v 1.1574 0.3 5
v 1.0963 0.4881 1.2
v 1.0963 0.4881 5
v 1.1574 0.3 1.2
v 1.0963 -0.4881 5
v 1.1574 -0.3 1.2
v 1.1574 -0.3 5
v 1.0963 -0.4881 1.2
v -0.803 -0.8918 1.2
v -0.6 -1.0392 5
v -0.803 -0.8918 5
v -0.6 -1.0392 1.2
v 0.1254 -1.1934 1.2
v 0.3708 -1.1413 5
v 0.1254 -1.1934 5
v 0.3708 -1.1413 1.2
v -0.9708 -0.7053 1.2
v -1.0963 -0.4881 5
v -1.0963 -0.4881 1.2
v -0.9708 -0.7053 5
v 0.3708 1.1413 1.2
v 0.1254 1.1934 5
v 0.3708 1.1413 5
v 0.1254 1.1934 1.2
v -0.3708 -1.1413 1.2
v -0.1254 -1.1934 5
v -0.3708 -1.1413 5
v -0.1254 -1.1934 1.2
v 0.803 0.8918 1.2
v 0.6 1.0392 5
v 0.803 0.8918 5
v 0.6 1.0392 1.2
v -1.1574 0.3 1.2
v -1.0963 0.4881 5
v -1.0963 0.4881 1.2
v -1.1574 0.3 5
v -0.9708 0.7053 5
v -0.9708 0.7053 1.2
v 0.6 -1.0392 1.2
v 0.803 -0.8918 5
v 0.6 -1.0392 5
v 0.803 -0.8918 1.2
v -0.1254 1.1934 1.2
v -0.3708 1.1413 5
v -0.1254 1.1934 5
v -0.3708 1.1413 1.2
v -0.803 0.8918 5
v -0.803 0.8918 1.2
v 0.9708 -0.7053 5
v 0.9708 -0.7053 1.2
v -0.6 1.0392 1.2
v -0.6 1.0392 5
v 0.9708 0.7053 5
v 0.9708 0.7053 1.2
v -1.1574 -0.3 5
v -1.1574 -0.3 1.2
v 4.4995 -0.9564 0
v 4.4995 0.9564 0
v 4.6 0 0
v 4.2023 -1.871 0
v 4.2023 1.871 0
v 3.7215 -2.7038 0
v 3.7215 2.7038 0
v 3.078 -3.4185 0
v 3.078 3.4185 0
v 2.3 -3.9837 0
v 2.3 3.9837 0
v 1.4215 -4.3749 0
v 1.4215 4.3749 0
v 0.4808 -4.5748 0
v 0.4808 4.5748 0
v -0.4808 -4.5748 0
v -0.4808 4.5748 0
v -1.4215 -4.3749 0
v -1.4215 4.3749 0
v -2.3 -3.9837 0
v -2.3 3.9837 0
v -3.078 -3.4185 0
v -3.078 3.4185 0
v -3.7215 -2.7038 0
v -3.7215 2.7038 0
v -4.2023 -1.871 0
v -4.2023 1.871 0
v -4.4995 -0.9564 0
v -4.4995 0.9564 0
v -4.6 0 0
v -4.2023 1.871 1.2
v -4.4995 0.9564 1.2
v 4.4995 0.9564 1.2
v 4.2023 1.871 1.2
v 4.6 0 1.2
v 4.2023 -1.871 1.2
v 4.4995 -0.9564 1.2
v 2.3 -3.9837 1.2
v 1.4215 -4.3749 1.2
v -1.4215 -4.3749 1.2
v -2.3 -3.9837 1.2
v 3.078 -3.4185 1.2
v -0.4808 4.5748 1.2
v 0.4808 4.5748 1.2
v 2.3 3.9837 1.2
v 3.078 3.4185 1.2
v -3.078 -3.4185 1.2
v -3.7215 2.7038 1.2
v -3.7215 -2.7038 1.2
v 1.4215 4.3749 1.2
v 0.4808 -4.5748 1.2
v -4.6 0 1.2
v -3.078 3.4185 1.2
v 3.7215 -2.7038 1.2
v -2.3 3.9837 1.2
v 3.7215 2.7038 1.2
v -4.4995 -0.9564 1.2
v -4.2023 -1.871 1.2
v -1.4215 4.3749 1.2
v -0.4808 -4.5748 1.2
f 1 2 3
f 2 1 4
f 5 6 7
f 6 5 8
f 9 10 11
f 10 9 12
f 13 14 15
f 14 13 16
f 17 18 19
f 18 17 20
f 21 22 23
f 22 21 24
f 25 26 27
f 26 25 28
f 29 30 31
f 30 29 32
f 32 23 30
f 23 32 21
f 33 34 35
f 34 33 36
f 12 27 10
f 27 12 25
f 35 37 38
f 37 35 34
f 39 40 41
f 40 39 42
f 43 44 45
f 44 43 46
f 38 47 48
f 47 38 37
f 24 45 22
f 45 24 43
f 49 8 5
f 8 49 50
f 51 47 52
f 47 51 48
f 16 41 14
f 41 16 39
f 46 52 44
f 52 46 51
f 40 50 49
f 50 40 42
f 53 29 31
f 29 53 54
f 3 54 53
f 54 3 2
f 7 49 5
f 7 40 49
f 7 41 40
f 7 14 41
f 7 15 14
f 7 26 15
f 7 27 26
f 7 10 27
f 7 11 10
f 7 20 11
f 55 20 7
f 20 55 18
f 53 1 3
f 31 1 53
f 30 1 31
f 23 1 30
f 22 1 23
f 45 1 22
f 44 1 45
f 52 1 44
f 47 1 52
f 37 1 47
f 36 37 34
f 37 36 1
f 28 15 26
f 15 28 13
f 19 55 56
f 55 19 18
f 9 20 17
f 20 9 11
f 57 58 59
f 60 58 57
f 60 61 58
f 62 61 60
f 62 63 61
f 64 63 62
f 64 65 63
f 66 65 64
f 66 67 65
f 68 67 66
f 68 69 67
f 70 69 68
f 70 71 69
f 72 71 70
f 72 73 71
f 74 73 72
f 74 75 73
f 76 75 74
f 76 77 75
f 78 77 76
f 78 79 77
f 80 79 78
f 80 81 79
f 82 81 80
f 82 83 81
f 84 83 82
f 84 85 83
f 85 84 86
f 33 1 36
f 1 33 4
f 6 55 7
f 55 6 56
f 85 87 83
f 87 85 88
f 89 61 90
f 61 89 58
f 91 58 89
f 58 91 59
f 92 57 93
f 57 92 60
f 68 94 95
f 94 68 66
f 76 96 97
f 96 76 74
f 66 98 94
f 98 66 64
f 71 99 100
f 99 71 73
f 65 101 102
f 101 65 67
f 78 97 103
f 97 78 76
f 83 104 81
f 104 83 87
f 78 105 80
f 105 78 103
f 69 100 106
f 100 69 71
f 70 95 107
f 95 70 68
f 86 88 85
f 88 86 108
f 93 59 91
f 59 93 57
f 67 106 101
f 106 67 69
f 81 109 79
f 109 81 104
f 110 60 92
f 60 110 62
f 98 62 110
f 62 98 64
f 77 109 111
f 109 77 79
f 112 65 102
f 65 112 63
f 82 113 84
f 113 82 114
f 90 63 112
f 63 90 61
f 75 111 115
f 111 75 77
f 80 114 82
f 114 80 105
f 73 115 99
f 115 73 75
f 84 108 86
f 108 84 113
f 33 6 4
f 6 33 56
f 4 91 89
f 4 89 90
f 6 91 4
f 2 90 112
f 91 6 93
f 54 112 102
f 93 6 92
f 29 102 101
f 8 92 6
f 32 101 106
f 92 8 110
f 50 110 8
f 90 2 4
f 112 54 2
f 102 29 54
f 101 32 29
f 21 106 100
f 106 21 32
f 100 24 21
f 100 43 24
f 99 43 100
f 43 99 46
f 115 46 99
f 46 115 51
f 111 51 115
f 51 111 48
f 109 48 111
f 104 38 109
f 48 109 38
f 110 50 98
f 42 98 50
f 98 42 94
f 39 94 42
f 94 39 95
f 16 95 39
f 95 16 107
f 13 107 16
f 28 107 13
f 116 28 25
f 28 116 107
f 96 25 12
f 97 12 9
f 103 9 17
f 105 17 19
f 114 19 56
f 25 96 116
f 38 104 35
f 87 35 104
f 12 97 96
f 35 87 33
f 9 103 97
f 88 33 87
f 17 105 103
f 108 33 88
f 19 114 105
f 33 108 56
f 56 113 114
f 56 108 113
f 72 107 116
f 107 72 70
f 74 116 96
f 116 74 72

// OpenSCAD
//////////////////////////////////////////////////////////////////////////////////////////////
module pin (
)
{
    
gear = 1;
    collaHeightOffset = 0;
    collaDiamater = 10;
    gearHeight = 3;
    keyWidth = 2;
    keyHeight = 2;
    collaWidth = 1.4;
    gearDiamater = 35;

    collaSpacing = 2.0;
    
    collaHeightOffset= 18- ((gear -1) * (7.35 ));
    
    bushingDi = 12;
    
    collaDiamater = 2.6 + ((gear -1)  * 2);
    discDiam = 2.6 + ((2 -1)  * 2);
    
    collaHeight = 15  + collaHeightOffset;
    bushingHeight = 2;
    tabHeight  = collaHeightOffset - gearHeight;
    innerCollaDiamater = collaDiamater - collaWidth;
    tabHeight =  (collaHeight / 30) + gearHeight * gear ;
innerCollaHeight = collaHeight * 3;
    
    union(){
        cylinder(1.2, discDiam, discDiam, false);
    
        difference(){
        cylinder(5, innerCollaDiamater, innerCollaDiamater, false);
            cube([11,0.6,13], true);
        }
    }
    
}
$fs = 0.01;

pin();
